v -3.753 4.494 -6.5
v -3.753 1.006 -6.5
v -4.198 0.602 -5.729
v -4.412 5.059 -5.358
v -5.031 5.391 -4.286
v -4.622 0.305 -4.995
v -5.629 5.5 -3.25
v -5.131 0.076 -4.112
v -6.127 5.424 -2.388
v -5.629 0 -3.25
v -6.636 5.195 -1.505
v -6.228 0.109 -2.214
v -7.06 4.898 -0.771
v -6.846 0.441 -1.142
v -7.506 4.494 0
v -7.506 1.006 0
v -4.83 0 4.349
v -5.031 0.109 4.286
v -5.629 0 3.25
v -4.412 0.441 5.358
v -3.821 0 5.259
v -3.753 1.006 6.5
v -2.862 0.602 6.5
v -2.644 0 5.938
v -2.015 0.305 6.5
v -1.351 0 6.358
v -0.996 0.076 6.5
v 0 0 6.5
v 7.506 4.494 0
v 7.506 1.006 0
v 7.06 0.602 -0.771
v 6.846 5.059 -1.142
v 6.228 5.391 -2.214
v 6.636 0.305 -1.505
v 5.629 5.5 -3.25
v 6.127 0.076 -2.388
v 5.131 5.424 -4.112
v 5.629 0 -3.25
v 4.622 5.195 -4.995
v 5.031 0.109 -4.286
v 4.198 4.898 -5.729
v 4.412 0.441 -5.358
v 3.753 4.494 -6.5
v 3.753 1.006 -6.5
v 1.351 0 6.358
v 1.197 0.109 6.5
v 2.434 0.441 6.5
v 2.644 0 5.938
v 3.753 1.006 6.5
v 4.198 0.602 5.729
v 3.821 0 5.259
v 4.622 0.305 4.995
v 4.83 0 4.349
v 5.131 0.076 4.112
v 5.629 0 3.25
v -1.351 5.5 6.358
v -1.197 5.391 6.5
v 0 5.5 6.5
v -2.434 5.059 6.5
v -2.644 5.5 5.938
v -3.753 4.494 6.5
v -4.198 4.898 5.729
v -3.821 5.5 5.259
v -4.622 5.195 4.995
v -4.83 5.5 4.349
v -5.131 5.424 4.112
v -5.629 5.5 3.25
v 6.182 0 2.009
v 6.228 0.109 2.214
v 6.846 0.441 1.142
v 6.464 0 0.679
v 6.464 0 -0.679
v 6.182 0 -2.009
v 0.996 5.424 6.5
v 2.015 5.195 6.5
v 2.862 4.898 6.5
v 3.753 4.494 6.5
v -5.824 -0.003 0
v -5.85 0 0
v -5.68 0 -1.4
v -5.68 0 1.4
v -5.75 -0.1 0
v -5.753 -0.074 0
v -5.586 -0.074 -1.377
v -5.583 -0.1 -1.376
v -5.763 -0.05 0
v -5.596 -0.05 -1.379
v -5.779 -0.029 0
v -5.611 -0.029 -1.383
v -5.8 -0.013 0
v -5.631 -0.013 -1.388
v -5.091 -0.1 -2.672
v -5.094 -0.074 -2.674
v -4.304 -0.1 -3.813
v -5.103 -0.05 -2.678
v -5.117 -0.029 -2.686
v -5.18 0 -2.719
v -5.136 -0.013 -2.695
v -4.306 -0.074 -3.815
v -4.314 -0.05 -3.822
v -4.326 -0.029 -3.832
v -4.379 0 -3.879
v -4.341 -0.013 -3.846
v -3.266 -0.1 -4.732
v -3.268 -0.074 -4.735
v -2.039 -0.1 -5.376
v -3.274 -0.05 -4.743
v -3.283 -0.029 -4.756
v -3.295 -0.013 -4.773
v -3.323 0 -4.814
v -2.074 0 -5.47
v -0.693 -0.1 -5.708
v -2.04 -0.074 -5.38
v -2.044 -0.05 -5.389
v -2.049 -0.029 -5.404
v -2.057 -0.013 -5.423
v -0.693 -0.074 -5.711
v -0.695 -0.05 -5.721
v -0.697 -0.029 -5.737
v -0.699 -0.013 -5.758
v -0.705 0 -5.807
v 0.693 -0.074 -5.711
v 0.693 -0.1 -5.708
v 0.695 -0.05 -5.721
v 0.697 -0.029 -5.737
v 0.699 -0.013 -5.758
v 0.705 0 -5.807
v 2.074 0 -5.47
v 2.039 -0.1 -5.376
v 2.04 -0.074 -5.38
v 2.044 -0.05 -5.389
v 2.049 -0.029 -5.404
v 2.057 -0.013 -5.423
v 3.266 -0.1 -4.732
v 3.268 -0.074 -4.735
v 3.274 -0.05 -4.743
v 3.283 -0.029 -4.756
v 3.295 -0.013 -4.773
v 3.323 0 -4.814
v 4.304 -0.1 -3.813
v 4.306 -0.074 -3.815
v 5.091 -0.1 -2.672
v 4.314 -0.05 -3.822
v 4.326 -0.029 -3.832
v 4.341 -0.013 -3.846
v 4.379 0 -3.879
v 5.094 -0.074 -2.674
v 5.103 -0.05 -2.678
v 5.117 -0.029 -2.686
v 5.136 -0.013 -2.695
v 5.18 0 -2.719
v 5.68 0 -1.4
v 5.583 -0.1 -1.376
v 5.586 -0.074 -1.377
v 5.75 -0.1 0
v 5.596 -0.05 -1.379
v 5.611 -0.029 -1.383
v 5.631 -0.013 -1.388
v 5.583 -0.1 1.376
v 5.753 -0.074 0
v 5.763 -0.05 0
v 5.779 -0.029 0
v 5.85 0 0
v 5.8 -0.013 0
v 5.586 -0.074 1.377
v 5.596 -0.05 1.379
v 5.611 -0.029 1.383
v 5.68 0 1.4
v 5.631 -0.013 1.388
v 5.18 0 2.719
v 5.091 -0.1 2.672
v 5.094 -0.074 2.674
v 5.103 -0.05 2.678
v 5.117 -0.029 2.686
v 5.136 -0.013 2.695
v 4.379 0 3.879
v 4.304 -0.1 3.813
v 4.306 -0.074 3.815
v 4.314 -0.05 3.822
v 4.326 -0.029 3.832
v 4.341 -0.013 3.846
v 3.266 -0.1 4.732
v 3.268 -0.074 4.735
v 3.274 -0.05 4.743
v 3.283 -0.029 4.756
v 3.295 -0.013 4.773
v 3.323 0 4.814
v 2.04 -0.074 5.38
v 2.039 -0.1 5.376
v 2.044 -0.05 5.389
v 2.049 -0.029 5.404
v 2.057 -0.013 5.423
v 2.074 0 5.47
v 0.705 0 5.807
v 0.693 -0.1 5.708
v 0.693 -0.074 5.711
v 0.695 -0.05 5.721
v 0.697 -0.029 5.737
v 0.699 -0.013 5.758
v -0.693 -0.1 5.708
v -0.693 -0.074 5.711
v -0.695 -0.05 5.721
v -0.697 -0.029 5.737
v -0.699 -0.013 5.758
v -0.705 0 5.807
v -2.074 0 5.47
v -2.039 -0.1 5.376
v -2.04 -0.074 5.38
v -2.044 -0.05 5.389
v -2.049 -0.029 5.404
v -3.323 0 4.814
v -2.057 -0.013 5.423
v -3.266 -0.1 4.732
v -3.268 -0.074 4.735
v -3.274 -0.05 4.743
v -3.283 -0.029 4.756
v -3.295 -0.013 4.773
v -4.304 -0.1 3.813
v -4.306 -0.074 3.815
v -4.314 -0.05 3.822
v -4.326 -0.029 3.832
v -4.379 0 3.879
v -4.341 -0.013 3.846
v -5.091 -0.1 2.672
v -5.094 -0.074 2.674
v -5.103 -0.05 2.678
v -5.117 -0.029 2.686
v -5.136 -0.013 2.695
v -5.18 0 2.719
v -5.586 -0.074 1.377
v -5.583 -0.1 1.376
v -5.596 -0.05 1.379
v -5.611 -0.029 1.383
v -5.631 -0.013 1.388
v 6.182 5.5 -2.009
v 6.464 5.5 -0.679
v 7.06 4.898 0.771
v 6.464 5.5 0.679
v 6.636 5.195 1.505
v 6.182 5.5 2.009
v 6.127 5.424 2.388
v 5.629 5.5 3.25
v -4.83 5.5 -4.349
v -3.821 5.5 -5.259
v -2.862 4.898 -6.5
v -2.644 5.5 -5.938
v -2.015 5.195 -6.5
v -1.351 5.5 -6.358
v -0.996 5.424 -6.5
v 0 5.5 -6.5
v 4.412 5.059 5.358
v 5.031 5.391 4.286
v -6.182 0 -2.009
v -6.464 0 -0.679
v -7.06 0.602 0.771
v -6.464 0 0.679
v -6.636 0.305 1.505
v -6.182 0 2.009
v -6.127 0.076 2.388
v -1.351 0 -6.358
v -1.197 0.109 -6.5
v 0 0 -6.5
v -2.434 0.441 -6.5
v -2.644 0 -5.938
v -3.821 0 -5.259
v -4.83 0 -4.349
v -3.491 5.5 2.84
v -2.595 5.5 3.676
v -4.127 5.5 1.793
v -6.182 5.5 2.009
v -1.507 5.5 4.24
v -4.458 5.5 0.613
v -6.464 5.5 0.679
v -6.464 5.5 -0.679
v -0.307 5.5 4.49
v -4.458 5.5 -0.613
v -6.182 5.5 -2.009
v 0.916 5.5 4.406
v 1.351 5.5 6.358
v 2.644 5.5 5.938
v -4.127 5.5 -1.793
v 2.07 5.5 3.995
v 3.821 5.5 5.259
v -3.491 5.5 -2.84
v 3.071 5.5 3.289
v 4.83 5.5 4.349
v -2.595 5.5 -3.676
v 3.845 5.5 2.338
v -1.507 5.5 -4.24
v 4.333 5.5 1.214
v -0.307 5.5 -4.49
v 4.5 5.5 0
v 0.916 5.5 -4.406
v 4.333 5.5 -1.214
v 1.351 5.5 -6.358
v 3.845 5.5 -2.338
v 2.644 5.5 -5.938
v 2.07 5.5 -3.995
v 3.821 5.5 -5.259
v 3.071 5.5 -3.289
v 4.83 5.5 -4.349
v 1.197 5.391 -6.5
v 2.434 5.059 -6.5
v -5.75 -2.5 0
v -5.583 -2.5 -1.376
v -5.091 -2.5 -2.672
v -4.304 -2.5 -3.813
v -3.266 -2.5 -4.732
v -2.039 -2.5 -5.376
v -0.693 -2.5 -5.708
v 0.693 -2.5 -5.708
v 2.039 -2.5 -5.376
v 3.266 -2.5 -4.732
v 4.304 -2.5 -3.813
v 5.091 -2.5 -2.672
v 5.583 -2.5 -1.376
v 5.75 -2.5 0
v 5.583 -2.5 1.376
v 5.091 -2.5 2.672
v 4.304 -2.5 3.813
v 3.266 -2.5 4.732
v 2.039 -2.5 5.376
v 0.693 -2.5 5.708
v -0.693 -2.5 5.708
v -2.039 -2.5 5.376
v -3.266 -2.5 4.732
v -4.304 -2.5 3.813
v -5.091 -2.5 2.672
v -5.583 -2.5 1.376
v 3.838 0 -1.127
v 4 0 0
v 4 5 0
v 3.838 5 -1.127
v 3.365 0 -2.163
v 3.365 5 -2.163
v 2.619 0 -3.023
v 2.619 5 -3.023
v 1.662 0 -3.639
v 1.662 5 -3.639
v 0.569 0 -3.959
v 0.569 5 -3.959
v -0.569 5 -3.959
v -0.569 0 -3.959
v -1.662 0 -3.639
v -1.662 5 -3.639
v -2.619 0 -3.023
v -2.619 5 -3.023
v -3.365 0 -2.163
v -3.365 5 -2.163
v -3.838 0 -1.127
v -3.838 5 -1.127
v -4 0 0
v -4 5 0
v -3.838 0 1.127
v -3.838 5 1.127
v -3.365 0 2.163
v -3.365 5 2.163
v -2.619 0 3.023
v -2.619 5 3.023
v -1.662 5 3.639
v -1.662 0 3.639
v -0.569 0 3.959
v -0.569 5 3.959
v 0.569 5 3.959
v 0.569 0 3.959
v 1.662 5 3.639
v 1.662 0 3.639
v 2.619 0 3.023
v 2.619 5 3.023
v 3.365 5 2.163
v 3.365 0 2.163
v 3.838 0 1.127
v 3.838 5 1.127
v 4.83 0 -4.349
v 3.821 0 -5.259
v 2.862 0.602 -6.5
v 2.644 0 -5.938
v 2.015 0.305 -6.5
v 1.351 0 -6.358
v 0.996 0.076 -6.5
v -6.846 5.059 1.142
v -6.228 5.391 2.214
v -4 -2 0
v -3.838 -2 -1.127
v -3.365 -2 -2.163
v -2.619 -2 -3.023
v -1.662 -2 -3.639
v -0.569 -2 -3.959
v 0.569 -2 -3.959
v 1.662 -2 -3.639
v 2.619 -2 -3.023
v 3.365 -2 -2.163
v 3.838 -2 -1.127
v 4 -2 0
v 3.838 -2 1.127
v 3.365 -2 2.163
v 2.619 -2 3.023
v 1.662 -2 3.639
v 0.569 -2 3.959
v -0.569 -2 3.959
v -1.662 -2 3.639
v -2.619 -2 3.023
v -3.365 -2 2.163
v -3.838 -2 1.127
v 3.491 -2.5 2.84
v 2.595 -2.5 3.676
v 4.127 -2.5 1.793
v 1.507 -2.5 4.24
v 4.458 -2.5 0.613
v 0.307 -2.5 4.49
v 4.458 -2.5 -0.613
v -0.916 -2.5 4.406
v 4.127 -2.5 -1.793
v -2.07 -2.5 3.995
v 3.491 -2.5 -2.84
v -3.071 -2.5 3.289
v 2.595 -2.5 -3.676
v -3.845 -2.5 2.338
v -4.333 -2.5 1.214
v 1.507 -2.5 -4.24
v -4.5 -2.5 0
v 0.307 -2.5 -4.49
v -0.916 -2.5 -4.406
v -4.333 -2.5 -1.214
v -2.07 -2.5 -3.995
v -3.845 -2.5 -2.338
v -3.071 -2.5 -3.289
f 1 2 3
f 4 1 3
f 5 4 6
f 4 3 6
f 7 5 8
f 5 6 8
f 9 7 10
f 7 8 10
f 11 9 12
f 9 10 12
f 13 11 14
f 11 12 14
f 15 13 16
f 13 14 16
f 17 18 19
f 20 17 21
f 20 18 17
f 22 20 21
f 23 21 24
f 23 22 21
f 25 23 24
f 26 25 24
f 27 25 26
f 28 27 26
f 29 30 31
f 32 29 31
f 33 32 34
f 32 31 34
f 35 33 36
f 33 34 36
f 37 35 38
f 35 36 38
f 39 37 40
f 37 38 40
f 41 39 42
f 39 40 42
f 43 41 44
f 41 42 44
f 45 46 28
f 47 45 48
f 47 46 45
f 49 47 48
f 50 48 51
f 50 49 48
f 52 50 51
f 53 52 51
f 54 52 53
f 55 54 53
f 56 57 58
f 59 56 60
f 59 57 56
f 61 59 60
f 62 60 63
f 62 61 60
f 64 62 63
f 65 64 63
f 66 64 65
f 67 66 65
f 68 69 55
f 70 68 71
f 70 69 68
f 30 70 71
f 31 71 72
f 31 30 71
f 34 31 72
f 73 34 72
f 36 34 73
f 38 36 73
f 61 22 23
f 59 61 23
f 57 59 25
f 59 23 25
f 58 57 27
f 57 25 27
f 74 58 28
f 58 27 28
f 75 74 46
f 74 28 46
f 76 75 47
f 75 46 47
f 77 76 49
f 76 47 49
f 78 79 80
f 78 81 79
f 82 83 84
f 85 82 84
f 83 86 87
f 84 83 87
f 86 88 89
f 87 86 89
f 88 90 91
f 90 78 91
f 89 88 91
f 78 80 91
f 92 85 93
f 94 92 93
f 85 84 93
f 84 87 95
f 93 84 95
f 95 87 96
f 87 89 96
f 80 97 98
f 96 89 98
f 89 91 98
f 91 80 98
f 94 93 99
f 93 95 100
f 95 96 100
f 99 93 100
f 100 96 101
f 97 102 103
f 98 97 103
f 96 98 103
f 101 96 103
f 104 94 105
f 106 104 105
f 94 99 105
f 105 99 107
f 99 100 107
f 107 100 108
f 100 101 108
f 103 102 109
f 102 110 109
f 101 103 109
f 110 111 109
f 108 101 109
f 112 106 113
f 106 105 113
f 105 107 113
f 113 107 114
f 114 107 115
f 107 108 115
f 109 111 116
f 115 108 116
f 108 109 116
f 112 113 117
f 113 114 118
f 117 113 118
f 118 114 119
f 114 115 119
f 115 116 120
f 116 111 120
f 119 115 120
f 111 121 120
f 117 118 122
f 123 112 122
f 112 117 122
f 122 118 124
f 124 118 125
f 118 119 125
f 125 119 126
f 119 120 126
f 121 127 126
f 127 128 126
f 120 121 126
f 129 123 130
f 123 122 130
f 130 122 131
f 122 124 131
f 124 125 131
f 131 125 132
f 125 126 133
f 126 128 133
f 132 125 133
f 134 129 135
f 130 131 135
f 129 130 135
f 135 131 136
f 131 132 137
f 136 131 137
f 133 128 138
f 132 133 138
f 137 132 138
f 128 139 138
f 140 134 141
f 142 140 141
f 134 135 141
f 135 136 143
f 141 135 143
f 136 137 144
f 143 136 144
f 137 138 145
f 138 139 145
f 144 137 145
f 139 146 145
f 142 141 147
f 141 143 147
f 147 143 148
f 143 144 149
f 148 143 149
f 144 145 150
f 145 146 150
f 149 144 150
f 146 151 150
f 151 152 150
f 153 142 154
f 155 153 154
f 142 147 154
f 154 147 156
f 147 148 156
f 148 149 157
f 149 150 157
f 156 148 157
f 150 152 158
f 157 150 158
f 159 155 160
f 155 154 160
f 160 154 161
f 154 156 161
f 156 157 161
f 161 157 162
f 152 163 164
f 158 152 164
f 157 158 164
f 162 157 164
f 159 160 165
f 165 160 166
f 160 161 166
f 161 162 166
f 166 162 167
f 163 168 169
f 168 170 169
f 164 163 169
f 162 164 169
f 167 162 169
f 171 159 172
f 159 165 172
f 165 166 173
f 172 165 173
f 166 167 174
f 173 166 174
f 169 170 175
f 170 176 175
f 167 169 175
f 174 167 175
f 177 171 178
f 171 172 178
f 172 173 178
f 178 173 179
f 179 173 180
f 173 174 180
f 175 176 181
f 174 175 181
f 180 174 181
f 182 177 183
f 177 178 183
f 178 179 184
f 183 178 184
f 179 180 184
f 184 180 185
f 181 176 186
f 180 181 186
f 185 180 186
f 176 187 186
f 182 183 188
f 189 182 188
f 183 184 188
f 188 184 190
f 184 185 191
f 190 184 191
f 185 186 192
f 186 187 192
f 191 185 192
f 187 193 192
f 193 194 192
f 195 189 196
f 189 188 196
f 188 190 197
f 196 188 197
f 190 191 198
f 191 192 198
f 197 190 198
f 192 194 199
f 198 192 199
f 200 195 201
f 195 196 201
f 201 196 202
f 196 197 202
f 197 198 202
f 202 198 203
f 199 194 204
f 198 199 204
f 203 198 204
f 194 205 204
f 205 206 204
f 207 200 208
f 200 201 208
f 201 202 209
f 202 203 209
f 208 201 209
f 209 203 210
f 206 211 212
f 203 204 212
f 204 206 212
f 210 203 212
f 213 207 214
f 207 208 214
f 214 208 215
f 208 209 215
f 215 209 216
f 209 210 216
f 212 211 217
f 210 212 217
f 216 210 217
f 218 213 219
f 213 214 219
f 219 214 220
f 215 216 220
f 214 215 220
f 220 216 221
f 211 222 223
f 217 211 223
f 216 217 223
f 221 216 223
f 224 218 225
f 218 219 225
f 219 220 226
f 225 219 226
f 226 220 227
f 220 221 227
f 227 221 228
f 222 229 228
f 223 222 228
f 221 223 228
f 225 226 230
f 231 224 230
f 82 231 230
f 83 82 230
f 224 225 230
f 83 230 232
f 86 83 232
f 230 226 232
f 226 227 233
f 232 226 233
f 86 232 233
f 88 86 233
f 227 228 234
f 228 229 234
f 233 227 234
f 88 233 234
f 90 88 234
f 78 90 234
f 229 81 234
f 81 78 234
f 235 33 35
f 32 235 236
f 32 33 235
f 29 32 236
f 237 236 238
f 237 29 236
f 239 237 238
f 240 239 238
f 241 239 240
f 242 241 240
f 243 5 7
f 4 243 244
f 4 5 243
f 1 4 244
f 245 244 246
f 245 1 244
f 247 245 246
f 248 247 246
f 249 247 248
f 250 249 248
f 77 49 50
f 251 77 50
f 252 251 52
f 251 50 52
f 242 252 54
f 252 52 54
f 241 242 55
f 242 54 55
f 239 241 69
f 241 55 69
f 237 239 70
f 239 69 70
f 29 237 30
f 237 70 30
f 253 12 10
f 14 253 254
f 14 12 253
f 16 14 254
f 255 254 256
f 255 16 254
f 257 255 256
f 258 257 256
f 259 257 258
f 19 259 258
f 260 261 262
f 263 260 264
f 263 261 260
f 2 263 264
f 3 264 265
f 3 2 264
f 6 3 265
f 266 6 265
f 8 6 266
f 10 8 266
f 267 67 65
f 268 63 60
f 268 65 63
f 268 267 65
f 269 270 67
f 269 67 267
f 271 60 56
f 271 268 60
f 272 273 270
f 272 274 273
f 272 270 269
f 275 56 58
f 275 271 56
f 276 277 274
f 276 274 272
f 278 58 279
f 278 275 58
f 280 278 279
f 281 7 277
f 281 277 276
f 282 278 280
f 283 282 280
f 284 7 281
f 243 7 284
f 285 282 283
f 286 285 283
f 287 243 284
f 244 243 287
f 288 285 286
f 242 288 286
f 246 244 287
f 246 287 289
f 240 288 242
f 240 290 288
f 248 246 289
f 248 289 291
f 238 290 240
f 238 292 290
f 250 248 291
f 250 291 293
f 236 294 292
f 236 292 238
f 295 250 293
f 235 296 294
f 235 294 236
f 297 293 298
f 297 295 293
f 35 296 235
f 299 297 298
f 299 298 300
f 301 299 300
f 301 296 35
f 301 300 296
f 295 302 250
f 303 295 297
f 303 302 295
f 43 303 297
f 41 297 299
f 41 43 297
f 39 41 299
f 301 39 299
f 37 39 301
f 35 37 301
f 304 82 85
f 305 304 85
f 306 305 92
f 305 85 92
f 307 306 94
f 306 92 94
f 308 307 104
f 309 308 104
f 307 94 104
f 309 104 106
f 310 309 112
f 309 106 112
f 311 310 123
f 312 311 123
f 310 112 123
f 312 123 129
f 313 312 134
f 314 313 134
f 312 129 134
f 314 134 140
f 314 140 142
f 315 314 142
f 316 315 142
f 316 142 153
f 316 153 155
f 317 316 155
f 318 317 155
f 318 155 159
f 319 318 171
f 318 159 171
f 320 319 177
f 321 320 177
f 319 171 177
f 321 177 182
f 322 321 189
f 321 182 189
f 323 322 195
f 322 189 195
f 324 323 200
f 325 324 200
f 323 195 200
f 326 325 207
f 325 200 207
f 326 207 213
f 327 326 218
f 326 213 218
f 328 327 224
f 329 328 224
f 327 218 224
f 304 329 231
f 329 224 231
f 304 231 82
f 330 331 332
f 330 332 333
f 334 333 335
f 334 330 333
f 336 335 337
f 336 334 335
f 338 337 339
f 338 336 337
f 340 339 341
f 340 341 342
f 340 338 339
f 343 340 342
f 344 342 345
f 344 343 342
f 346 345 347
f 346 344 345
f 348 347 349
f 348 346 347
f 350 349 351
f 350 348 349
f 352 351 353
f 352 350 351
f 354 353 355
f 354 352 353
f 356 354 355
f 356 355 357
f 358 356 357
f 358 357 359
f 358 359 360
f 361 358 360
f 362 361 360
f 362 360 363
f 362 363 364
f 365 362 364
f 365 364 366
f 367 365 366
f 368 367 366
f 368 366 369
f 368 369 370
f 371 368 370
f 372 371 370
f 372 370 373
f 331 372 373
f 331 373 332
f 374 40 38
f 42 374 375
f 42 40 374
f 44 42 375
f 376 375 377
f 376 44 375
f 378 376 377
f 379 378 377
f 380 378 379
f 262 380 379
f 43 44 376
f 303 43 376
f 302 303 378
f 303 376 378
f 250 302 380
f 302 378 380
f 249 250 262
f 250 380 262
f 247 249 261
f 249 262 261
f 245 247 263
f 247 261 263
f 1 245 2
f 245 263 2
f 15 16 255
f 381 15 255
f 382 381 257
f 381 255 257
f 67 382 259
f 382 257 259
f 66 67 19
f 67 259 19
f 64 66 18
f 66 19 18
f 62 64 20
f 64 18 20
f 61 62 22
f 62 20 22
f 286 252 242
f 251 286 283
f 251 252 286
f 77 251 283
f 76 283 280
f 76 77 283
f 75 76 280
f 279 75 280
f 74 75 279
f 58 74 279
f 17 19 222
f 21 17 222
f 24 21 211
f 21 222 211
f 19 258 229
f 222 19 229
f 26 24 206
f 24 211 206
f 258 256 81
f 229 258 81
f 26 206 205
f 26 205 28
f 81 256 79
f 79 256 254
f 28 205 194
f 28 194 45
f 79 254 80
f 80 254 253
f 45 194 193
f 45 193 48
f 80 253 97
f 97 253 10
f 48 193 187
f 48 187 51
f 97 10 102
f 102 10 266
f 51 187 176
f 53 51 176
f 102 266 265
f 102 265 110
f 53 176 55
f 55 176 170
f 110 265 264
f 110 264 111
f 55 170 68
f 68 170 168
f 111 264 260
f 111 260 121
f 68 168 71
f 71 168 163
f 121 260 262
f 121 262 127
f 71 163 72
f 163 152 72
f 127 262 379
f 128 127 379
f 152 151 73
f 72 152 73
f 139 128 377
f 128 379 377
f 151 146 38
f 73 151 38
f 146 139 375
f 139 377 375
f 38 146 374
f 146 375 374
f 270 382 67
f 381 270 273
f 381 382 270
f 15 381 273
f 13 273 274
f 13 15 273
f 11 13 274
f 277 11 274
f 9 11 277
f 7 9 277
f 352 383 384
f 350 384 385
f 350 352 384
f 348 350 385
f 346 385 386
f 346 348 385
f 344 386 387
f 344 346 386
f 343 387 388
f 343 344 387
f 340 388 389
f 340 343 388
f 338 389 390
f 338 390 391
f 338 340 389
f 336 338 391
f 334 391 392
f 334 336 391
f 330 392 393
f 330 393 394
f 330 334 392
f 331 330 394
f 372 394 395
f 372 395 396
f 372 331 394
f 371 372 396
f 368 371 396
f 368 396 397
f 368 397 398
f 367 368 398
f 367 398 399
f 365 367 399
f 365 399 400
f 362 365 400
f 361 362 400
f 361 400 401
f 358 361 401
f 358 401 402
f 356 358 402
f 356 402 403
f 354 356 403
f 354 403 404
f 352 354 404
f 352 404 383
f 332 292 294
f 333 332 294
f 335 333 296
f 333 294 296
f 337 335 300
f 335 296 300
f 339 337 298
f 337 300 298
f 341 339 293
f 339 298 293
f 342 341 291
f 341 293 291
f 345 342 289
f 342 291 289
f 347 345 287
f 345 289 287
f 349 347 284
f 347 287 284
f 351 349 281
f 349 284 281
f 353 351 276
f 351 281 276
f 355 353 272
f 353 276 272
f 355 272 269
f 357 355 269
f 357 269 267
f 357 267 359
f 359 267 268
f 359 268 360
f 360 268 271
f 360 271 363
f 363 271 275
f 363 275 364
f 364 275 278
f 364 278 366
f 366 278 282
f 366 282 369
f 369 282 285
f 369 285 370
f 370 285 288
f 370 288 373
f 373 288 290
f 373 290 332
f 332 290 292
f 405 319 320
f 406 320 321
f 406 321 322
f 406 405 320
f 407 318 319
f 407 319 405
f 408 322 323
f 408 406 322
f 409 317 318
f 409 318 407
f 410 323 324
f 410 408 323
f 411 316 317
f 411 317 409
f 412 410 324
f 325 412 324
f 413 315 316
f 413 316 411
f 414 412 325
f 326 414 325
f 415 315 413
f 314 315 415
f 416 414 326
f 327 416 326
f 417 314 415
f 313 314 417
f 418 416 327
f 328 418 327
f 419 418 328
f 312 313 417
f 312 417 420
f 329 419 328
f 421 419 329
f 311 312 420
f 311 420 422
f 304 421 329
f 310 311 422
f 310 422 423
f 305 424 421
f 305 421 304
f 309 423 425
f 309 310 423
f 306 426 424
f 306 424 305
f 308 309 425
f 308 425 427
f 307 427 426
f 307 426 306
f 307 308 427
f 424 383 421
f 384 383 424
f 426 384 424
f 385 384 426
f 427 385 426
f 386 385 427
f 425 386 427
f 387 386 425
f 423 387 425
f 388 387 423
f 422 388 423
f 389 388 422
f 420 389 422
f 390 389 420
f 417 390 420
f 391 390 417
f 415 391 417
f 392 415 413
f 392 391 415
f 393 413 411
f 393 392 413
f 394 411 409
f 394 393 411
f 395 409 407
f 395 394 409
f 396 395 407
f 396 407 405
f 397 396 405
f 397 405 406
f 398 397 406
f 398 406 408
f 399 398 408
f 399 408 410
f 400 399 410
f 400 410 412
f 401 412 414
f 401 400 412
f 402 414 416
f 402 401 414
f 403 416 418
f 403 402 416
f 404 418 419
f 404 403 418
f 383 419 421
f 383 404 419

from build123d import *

# Parameters (mm, degrees)
SZKIC1_R                    = 4
DODANIE_WYCI_GNI_CIE1_DEPTH = 5.5
SZKIC2_OUTSIDE_W            = 34.134
SZKIC2_OUTSIDE_H            = 32.122
SZKIC2_OUTSIDE_R            = 6.5
WYTNIJ_WYCI_GNI_CIE29_DEPTH = 6.5
WYTNIJ_WYCI_GNI_CIE29_TAPER = 45
SZKIC4_R                    = 5.75
SZKIC4_R_2                  = 4
DODANIE_WYCI_GNI_CIE2_DEPTH = 2.5
SZKIC5_OUTSIDE_W            = 41.294
SZKIC5_OUTSIDE_H            = 39.282
SZKIC5_OUTSIDE_R            = 6.5
WYTNIJ_WYCI_GNI_CIE30_DEPTH = 10
WYTNIJ_WYCI_GNI_CIE30_TAPER = 45
ZAOKR_GLENIE1_R             = 0.1
SFAZOWANIE1_SIZE            = 0.5


with BuildPart() as part:
    # Szkic1 → Dodanie-wyciągnięcie1 (new body)
    with BuildSketch(Plane(origin=(0, 0, 0), x_dir=(1, 0, 0), z_dir=(0, 1, 0))):
        Polygon((7.505553499, 0), (3.75277675, 6.5), (-3.75277675, 6.5), (-7.505553499, 0), (-3.75277675, -6.5), (3.75277675, -6.5), align=None)
        Circle(SZKIC1_R, mode=Mode.SUBTRACT)
    extrude(amount=DODANIE_WYCI_GNI_CIE1_DEPTH)

    # Szkic2 outside → Wytnij-wyciągnięcie29 (cut, through all)
    with BuildSketch(Plane(origin=(0, 5.5, 0), x_dir=(1, 0, 0), z_dir=(0, 1, 0))):
        Rectangle(SZKIC2_OUTSIDE_W, SZKIC2_OUTSIDE_H)
        Circle(SZKIC2_OUTSIDE_R, mode=Mode.SUBTRACT)
    extrude(amount=-WYTNIJ_WYCI_GNI_CIE29_DEPTH, taper=WYTNIJ_WYCI_GNI_CIE29_TAPER, mode=Mode.SUBTRACT)

    # Szkic4 → Dodanie-wyciągnięcie2 (add)
    with BuildSketch(Plane(origin=(0, 0, 0), x_dir=(-1, 0, 0), z_dir=(0, -1, 0))):
        Circle(SZKIC4_R)
        Circle(SZKIC4_R_2, mode=Mode.SUBTRACT)
    extrude(amount=DODANIE_WYCI_GNI_CIE2_DEPTH)

    # Szkic5 outside → Wytnij-wyciągnięcie30 (cut)
    with BuildSketch(Plane(origin=(0, 0, 0), x_dir=(-1, 0, 0), z_dir=(0, -1, 0))):
        Rectangle(SZKIC5_OUTSIDE_W, SZKIC5_OUTSIDE_H)
        Circle(SZKIC5_OUTSIDE_R, mode=Mode.SUBTRACT)
    extrude(amount=-WYTNIJ_WYCI_GNI_CIE30_DEPTH, taper=WYTNIJ_WYCI_GNI_CIE30_TAPER, mode=Mode.SUBTRACT)

    # Zaokrąglenie1
    zaokr_glenie1_edges = [part.edges().sort_by_distance(p)[0] for p in [
        (5.75, 0, 0),
    ]]
    fillet(zaokr_glenie1_edges, radius=ZAOKR_GLENIE1_R)

    # Sfazowanie1
    sfazowanie1_edges = [part.edges().sort_by_distance(p)[0] for p in [
        (-4, 5.5, 0),
        (4, -2.5, 0),
    ]]
    chamfer(sfazowanie1_edges, length=SFAZOWANIE1_SIZE)


solid = part.part
